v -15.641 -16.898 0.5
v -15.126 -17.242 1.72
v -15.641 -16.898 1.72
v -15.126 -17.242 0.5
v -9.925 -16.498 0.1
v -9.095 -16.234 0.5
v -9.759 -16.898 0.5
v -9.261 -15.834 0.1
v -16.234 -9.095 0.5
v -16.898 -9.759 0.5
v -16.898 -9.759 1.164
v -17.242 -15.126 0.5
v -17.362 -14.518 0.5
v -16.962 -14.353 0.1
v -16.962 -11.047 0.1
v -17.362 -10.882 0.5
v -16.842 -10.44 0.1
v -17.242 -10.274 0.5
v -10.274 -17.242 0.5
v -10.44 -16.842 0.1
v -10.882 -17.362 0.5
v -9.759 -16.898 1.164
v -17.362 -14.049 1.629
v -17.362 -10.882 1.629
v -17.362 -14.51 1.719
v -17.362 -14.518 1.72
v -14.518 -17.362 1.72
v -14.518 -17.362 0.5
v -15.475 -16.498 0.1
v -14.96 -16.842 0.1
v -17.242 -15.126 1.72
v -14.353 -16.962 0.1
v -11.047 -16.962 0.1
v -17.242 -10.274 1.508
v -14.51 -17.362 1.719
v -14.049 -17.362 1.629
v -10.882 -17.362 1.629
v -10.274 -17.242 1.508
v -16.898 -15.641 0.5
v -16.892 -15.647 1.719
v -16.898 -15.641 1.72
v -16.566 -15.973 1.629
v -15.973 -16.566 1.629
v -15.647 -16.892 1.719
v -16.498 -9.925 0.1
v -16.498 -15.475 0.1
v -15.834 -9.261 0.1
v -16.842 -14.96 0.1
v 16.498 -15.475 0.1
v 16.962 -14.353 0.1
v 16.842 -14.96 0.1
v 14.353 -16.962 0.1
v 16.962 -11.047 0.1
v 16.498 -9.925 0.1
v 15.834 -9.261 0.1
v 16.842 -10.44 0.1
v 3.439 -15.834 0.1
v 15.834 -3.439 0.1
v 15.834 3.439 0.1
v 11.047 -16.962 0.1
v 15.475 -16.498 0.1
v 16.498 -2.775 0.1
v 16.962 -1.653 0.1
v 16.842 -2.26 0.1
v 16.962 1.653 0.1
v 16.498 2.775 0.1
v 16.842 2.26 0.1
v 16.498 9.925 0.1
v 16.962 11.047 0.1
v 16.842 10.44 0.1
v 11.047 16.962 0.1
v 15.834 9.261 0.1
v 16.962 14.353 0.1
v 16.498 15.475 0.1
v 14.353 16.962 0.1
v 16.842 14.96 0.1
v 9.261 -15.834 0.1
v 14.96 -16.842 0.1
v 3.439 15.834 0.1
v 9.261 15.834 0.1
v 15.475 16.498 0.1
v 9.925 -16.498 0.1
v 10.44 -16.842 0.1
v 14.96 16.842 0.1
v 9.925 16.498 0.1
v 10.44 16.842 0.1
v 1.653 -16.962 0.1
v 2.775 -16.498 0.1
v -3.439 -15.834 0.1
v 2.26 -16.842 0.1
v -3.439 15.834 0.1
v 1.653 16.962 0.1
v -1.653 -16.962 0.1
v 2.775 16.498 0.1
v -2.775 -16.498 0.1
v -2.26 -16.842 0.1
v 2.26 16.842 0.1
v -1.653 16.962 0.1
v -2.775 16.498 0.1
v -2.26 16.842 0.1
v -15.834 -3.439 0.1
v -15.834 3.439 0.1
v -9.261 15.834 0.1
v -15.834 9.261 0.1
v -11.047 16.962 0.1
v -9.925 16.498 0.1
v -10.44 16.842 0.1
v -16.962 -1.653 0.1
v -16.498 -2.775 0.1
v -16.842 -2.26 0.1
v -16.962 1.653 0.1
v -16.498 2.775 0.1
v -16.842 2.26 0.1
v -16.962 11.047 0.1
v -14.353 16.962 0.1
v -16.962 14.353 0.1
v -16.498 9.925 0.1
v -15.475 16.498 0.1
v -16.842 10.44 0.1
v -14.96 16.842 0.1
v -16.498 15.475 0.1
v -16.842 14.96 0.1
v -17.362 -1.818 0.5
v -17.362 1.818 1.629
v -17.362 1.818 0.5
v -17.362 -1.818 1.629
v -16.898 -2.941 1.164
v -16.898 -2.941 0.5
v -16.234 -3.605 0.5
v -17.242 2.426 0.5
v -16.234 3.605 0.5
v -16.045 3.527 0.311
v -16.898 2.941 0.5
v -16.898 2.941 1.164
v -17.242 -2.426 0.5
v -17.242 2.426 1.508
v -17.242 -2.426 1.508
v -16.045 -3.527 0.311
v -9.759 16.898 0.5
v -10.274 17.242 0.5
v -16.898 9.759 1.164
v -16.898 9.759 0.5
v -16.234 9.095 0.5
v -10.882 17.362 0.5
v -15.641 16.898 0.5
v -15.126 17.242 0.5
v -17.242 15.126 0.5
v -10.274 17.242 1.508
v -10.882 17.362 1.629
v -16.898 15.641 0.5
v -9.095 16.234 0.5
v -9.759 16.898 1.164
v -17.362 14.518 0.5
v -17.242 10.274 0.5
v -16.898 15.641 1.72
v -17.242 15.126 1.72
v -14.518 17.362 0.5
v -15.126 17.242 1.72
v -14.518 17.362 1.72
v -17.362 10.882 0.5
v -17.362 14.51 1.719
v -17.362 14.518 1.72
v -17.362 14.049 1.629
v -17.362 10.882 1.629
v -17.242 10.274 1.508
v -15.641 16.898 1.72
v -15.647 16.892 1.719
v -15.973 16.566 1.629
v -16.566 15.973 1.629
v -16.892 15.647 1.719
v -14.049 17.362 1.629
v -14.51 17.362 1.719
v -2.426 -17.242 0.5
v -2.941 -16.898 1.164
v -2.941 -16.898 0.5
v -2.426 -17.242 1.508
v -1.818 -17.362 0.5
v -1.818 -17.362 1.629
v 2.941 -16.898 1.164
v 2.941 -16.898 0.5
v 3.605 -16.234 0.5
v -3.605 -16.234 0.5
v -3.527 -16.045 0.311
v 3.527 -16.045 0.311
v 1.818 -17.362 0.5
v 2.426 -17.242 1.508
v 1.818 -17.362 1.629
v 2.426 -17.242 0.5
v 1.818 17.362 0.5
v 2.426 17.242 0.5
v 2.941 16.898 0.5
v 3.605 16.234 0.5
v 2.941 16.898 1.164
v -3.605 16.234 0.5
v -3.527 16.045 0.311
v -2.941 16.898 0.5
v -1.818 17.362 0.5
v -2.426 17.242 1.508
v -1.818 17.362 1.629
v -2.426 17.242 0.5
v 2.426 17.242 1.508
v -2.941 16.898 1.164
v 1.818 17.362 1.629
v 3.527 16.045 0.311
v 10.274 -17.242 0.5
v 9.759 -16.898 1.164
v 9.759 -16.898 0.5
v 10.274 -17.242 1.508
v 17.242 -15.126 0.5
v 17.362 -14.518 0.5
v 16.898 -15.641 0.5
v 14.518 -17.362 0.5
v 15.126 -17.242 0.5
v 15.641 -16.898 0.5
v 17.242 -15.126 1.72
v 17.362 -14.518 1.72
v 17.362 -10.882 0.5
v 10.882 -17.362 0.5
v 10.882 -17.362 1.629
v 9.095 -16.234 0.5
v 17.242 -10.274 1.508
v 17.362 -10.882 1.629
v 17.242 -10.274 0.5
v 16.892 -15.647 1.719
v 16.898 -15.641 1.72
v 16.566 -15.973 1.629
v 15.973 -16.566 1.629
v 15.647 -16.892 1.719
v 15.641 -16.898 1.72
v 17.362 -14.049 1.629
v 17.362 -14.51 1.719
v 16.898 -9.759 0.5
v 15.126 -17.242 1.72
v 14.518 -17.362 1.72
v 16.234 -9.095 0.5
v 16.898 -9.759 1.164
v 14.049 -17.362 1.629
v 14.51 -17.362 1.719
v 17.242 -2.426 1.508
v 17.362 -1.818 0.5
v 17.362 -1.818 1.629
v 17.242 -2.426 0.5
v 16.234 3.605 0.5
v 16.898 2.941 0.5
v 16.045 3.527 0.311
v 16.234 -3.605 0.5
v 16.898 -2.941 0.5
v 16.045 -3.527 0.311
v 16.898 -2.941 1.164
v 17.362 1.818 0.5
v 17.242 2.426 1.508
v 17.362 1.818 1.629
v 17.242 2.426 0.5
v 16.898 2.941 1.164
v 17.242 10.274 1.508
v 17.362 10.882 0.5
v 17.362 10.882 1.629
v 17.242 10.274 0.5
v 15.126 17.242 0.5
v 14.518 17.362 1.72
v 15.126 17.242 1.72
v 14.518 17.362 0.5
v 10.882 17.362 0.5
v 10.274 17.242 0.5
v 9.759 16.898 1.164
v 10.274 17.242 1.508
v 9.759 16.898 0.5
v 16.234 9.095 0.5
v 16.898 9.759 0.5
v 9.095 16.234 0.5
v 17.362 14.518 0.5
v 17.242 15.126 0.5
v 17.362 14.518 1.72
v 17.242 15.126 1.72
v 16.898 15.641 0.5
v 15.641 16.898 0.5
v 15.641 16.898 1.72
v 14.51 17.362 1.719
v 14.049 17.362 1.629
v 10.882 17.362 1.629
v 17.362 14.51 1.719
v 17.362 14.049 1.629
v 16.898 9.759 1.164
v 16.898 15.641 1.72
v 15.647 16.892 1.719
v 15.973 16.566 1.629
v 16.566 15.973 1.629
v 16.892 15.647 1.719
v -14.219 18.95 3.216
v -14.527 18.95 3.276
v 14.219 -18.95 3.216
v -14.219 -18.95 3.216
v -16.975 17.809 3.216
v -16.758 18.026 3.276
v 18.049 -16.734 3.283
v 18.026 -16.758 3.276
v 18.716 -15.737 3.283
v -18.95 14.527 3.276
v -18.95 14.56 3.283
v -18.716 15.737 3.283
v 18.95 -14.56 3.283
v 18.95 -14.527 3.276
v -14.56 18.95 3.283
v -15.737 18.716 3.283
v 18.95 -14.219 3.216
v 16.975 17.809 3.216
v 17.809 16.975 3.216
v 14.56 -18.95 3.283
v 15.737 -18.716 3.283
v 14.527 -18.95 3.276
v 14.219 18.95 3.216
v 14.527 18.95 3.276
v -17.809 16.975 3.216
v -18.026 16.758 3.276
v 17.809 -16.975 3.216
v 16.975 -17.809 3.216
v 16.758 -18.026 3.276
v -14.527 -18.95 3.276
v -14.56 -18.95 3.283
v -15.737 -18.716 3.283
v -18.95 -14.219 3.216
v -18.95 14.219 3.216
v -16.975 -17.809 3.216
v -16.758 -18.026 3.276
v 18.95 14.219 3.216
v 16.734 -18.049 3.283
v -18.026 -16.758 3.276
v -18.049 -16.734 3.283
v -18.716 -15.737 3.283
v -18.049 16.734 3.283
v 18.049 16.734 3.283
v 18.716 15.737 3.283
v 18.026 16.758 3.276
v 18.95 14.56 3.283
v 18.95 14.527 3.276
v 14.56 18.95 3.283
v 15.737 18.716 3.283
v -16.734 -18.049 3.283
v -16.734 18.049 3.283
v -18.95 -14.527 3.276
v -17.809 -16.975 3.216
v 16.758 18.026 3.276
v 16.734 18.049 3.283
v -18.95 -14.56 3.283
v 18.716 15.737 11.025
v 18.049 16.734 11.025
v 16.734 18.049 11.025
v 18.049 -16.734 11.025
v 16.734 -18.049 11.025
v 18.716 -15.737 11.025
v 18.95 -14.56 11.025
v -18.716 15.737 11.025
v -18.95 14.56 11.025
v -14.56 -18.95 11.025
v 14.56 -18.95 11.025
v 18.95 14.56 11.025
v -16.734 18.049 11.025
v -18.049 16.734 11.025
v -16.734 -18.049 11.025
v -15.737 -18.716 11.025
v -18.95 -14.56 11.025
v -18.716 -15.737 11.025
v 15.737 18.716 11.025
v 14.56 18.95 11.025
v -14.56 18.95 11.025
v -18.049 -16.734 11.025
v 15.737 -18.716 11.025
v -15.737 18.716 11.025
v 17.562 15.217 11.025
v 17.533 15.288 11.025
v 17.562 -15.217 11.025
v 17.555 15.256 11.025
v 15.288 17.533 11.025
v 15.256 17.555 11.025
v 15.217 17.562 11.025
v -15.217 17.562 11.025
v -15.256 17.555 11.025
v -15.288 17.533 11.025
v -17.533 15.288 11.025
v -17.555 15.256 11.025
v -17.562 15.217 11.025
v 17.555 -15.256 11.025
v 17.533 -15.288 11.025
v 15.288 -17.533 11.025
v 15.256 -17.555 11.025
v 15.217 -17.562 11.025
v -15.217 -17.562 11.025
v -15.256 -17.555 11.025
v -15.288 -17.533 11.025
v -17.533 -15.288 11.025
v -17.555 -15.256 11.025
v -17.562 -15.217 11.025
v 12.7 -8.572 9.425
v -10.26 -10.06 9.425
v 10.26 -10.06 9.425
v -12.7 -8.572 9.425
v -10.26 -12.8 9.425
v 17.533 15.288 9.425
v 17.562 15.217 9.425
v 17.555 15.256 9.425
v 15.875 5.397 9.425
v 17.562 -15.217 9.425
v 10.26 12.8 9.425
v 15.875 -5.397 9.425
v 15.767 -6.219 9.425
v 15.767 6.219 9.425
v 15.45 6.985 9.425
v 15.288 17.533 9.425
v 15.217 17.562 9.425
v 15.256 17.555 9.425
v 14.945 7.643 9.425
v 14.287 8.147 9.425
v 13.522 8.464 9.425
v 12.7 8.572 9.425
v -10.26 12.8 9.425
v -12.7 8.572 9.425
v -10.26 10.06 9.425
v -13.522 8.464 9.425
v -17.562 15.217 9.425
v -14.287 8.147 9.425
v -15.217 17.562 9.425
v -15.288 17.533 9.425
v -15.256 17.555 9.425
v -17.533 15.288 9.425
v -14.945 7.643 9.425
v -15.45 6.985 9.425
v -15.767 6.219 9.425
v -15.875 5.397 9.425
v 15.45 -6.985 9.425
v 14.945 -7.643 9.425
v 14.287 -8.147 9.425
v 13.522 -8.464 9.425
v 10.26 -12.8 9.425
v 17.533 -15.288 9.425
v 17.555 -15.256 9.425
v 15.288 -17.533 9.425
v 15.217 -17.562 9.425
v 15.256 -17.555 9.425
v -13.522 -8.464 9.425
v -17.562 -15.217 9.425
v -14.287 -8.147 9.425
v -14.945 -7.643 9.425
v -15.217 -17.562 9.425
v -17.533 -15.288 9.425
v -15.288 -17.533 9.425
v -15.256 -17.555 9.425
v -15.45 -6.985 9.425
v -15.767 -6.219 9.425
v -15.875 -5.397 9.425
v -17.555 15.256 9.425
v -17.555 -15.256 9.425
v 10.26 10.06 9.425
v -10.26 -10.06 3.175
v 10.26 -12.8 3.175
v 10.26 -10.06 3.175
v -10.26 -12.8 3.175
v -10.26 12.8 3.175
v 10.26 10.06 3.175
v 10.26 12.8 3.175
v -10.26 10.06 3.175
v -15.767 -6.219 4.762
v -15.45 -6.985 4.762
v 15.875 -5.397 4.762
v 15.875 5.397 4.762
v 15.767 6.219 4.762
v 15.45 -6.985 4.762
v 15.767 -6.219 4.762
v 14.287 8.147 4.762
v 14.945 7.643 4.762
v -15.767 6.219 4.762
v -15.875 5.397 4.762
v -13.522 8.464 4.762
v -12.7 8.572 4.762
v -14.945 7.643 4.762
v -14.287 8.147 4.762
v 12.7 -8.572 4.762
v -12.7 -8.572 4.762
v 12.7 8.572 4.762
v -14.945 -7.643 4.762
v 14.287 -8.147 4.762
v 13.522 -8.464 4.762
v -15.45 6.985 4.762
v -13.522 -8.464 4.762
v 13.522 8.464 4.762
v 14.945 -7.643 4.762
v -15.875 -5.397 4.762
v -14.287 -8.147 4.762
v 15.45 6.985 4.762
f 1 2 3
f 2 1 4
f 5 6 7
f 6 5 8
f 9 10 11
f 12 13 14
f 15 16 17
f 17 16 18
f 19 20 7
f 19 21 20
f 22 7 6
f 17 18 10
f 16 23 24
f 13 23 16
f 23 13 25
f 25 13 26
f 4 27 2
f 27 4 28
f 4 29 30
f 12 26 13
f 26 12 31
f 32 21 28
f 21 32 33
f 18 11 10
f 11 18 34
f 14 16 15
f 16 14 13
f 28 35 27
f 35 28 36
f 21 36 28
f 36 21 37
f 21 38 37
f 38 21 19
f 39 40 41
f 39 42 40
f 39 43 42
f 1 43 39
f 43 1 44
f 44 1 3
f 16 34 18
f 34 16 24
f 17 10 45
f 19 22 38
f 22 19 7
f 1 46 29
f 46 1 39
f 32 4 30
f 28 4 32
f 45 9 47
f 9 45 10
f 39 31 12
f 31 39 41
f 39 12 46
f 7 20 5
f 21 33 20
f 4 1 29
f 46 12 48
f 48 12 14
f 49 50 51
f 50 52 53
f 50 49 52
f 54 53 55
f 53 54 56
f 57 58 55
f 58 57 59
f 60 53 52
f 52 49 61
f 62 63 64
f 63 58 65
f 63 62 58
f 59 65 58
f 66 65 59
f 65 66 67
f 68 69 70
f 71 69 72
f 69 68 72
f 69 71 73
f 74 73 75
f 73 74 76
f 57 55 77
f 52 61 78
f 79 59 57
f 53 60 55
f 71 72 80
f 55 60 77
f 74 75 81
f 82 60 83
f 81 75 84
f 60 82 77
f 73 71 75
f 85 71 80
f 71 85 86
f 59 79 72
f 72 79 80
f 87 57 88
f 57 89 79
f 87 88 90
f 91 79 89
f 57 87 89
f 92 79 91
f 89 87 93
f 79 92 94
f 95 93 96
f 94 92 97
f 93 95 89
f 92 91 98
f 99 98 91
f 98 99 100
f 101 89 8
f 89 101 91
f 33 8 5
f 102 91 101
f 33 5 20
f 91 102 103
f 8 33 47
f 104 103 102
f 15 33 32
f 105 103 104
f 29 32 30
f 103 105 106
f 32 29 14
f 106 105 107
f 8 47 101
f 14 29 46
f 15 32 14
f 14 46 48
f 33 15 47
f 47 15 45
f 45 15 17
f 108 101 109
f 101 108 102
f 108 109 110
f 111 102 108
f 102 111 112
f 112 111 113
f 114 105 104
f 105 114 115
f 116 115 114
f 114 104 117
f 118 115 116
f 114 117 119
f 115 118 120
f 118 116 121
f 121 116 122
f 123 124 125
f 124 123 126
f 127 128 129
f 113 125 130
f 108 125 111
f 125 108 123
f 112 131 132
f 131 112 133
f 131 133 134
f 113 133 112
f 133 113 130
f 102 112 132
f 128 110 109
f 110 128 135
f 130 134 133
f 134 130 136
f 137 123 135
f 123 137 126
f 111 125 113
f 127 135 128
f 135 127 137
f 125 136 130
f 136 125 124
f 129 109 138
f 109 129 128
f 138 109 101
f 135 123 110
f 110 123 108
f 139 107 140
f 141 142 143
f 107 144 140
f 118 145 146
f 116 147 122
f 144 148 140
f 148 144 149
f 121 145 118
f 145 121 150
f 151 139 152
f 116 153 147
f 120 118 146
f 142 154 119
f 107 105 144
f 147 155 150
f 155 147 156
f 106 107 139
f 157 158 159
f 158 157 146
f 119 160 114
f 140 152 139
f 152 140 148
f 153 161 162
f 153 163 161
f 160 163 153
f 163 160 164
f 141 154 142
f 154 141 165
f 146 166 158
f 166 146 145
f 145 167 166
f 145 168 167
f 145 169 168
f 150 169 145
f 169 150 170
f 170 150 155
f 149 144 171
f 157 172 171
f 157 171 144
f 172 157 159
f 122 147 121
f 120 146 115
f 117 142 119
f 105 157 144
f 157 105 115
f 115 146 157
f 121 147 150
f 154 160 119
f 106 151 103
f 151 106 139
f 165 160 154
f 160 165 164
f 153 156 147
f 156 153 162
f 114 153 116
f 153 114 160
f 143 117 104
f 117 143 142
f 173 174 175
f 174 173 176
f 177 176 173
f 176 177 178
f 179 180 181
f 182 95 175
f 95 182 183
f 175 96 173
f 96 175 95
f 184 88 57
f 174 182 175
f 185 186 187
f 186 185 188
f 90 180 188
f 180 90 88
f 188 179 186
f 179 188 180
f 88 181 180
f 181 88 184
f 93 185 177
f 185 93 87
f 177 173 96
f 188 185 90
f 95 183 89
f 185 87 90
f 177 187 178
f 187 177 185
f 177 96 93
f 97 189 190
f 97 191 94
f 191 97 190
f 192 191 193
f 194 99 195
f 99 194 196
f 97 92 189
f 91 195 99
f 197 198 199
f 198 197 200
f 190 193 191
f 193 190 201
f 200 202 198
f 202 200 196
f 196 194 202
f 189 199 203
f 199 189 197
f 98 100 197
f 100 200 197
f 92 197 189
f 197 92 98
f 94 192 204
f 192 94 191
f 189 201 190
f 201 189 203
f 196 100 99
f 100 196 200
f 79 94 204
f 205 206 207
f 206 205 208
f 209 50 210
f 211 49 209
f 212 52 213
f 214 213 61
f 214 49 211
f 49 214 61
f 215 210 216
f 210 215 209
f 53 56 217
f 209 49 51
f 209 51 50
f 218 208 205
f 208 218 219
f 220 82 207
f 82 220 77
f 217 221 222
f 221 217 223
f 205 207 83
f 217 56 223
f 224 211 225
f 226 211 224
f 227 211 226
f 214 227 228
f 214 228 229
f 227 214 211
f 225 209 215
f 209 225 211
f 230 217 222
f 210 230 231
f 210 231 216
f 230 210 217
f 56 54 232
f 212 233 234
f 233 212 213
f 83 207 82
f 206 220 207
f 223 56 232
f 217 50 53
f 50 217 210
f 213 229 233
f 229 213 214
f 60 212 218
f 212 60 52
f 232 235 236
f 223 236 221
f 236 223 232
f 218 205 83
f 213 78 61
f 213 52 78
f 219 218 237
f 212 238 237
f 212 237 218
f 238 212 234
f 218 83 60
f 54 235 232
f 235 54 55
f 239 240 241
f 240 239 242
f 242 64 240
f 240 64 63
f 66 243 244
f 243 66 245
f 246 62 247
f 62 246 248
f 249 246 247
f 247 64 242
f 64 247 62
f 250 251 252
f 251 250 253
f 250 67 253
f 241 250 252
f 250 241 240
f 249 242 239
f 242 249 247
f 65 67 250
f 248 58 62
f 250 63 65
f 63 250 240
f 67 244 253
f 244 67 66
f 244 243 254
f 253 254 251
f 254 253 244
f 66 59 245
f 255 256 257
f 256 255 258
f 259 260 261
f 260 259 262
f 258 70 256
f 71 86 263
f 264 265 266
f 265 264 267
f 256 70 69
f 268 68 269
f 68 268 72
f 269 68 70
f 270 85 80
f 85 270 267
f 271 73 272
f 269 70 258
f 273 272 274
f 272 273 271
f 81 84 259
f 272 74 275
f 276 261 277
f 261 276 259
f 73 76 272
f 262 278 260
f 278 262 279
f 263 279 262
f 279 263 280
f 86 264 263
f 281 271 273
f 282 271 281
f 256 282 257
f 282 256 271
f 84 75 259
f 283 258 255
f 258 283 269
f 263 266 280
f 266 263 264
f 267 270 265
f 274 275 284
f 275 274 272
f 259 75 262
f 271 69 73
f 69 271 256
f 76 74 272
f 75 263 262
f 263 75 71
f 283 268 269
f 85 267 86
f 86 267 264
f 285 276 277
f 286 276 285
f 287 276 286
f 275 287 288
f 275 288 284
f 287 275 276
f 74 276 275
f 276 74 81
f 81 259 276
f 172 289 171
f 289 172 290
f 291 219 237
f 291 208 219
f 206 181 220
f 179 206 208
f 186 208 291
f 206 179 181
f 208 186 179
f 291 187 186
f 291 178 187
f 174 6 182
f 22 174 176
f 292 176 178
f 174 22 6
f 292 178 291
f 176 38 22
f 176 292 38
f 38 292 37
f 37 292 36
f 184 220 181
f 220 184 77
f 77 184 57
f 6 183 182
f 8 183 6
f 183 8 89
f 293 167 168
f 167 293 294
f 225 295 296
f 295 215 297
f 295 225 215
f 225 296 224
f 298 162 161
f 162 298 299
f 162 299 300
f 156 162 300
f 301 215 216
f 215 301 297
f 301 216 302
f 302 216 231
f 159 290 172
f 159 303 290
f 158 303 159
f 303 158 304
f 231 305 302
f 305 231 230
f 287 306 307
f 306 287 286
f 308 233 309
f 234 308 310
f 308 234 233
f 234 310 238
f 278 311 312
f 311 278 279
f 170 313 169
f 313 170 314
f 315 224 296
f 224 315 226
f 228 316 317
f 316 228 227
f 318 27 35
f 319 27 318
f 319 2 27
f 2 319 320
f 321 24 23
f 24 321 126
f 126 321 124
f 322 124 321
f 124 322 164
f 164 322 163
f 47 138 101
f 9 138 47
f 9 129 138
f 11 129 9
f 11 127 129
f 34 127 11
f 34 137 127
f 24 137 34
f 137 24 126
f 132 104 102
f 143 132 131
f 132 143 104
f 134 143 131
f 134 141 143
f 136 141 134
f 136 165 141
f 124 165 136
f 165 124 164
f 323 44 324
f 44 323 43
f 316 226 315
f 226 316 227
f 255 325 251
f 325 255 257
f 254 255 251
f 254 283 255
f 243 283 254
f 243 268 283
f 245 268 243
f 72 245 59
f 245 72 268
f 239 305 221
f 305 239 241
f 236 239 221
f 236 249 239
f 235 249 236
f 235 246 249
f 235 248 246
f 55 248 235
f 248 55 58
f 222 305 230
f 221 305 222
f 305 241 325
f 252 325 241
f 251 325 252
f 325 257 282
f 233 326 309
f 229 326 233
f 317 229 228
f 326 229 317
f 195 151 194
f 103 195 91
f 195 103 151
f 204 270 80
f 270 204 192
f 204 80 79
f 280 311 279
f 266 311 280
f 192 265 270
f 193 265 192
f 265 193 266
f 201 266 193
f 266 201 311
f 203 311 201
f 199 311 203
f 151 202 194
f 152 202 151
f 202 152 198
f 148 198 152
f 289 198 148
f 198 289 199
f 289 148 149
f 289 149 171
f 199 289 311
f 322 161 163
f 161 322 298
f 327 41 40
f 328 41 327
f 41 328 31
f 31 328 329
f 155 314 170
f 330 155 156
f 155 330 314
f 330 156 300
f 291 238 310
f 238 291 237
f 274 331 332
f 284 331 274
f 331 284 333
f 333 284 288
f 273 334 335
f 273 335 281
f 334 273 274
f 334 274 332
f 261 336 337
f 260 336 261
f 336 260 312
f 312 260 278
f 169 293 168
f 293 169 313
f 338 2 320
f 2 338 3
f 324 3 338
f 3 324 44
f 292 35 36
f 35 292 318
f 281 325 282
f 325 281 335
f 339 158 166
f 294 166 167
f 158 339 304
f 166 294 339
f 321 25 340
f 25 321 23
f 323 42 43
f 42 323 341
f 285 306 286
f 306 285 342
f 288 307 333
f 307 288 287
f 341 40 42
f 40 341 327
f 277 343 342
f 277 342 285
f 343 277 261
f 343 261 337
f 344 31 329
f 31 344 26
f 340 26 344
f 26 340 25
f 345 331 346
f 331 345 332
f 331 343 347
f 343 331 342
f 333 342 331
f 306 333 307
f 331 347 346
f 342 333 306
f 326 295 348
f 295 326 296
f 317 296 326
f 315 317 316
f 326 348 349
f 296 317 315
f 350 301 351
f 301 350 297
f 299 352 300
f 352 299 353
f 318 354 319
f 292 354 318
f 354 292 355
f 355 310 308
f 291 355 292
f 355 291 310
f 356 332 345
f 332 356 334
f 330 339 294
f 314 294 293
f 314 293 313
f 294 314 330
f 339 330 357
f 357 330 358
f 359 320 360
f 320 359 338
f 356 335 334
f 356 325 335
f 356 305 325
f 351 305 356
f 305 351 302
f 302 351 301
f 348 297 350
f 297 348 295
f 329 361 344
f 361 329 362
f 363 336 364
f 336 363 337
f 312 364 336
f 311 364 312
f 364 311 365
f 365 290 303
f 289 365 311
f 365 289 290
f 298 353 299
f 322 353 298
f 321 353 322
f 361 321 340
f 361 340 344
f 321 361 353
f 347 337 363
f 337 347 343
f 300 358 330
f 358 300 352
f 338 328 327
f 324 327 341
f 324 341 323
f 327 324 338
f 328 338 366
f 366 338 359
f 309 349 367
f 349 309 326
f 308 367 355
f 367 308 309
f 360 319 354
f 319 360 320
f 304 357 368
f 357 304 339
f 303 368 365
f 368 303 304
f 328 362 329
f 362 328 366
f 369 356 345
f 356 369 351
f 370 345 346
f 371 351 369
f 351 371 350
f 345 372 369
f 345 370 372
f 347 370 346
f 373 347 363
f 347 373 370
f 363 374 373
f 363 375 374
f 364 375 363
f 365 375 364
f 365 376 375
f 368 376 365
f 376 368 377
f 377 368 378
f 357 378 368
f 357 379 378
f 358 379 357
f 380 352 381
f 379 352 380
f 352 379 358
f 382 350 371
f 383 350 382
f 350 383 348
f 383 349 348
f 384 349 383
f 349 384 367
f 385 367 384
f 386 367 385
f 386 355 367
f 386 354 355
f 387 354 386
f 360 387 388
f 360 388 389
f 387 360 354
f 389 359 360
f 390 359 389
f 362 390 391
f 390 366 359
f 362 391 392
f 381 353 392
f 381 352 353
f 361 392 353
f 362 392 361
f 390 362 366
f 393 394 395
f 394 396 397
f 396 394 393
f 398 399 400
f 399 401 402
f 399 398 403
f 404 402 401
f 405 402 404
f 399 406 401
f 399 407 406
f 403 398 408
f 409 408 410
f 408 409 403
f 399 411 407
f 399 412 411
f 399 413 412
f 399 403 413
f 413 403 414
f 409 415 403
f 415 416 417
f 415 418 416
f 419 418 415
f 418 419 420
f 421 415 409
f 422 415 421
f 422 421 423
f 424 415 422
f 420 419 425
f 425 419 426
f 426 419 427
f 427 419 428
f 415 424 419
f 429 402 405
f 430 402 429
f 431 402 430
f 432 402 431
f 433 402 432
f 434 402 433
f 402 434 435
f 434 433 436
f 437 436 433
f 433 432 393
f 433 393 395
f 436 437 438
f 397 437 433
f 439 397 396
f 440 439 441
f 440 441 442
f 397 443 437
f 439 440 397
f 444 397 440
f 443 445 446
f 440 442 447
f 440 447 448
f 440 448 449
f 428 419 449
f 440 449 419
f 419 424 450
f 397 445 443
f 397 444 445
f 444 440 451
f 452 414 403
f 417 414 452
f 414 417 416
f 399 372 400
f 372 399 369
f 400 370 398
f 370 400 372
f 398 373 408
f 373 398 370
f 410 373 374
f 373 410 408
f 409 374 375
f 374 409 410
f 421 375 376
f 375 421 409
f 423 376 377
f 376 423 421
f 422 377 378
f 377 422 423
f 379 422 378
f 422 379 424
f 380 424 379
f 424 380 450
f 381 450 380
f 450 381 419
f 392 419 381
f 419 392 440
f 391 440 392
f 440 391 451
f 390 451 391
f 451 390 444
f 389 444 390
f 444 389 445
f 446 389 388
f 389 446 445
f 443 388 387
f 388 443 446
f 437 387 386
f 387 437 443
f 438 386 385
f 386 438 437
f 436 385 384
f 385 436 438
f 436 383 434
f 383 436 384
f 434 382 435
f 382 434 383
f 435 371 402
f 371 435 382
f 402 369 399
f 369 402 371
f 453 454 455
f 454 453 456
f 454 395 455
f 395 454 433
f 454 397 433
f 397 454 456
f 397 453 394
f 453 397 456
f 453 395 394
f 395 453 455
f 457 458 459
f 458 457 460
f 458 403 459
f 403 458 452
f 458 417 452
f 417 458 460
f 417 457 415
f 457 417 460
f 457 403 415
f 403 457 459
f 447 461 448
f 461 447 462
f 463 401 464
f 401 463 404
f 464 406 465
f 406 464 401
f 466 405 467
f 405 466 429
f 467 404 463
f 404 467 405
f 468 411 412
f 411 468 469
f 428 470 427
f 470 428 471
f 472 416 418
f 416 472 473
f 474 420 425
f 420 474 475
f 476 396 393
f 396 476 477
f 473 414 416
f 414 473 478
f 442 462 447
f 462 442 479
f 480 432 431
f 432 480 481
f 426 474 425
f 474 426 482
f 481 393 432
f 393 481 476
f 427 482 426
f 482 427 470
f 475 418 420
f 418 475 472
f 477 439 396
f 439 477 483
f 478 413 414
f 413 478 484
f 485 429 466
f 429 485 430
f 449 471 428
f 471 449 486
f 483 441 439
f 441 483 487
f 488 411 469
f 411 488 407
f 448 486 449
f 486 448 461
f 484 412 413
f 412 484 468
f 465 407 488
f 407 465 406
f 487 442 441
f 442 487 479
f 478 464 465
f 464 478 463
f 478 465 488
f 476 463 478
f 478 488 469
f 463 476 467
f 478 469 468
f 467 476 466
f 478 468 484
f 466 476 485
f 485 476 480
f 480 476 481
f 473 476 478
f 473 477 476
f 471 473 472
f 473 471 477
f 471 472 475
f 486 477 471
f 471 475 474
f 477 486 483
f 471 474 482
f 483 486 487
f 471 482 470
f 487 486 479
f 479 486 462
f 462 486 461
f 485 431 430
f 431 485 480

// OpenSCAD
// WeMosHeaderHolder0.1
// 
// Holds two rows of 'female dupont' headers
// straight so that you can set your WeMos D1 mini on top
// (CPU side down, by convention) and solder the legs on.

block_size      = ["1chunk","1chunk","3/8inch"];
header_cutout_size = ["8/10inch","1/10inch","1/4inch"];
header_cutout_row_spacing = "9/10inch";
header_cutout_margin  = "0.1mm";

cross_section = false;

$fn = 24;
$tgx11_offset = -0.1;

use <../lib/TGx11.1Lib.scad>
use <../lib/TOGMod1.scad>
use <../lib/TOGMod1Constructors.scad>
use <../lib/TOGUnits1.scad>
use <../lib/TOGPolyhedronLib1.scad>

$togridlib3_unit_table = tgx11_get_default_unit_table();

function reverse_list(list) =
	[for(i=[len(list)-1 : -1 : 0]) list[i]];

function mirror_rathnodes(nodes) = [
	for(n=nodes) n,
	for(n=reverse_list(nodes)) [n[0], [-n[1][0], n[1][1]], for(i=[2:1:len(n)-1]) n[i]],
];

header_cutout_size_mm        = togunits1_decode_vec(header_cutout_size       );
header_cutout_margin_mm      = togunits1_decode(    header_cutout_margin     );
header_cutout_row_spacing_mm = togunits1_decode(    header_cutout_row_spacing);

// togmod1_domodule(togmod1_linear_extrude_z([0, length_mm], the_clip_2d));

block_size_ca = togunits1_vec_to_cas(block_size);
block_size_mm = togunits1_decode_vec(block_size_ca);

deck_z = block_size_mm[2];

header_cutout = togmod1_make_cuboid([
	header_cutout_size_mm[0] + header_cutout_margin_mm*2,
	header_cutout_size_mm[1] + header_cutout_margin_mm*2,
	header_cutout_size_mm[2]*2,
]);

the_cavity = ["union",
	// HEader holders
	for( ym=[-1,1] ) ["translate", [0,ym*header_cutout_row_spacing_mm/2,deck_z], header_cutout],
	
   // Central 'decorative' cavity
	["translate", [0,0,deck_z],
	   tphl1_make_rounded_cuboid([
			block_size_mm[0] - 2*3.175,
			header_cutout_row_spacing_mm - header_cutout_size_mm[1] - 2*254/160,
			(deck_z-25.4*3/16)*2
		], r=[3.175,3.175,0], corner_shape="ovoid1")],
];

the_thing = ["difference",
	tgx11_block(
		block_size_ca,
		bottom_segmentation = "chatom",
		bottom_foot_bevel = 0.4,
		top_segmentation = "block",
		lip_height = 1.5
	),
	
	the_cavity
];

togmod1_domodule(["difference",
	the_thing,
	
	if( cross_section ) ["translate",
		[-block_size_mm[0]/2,-block_size_mm[1]/2,block_size_mm[2]/2],
		togmod1_make_cuboid([block_size_mm[0], block_size_mm[1], block_size_mm[2]*2])
	],
]);
